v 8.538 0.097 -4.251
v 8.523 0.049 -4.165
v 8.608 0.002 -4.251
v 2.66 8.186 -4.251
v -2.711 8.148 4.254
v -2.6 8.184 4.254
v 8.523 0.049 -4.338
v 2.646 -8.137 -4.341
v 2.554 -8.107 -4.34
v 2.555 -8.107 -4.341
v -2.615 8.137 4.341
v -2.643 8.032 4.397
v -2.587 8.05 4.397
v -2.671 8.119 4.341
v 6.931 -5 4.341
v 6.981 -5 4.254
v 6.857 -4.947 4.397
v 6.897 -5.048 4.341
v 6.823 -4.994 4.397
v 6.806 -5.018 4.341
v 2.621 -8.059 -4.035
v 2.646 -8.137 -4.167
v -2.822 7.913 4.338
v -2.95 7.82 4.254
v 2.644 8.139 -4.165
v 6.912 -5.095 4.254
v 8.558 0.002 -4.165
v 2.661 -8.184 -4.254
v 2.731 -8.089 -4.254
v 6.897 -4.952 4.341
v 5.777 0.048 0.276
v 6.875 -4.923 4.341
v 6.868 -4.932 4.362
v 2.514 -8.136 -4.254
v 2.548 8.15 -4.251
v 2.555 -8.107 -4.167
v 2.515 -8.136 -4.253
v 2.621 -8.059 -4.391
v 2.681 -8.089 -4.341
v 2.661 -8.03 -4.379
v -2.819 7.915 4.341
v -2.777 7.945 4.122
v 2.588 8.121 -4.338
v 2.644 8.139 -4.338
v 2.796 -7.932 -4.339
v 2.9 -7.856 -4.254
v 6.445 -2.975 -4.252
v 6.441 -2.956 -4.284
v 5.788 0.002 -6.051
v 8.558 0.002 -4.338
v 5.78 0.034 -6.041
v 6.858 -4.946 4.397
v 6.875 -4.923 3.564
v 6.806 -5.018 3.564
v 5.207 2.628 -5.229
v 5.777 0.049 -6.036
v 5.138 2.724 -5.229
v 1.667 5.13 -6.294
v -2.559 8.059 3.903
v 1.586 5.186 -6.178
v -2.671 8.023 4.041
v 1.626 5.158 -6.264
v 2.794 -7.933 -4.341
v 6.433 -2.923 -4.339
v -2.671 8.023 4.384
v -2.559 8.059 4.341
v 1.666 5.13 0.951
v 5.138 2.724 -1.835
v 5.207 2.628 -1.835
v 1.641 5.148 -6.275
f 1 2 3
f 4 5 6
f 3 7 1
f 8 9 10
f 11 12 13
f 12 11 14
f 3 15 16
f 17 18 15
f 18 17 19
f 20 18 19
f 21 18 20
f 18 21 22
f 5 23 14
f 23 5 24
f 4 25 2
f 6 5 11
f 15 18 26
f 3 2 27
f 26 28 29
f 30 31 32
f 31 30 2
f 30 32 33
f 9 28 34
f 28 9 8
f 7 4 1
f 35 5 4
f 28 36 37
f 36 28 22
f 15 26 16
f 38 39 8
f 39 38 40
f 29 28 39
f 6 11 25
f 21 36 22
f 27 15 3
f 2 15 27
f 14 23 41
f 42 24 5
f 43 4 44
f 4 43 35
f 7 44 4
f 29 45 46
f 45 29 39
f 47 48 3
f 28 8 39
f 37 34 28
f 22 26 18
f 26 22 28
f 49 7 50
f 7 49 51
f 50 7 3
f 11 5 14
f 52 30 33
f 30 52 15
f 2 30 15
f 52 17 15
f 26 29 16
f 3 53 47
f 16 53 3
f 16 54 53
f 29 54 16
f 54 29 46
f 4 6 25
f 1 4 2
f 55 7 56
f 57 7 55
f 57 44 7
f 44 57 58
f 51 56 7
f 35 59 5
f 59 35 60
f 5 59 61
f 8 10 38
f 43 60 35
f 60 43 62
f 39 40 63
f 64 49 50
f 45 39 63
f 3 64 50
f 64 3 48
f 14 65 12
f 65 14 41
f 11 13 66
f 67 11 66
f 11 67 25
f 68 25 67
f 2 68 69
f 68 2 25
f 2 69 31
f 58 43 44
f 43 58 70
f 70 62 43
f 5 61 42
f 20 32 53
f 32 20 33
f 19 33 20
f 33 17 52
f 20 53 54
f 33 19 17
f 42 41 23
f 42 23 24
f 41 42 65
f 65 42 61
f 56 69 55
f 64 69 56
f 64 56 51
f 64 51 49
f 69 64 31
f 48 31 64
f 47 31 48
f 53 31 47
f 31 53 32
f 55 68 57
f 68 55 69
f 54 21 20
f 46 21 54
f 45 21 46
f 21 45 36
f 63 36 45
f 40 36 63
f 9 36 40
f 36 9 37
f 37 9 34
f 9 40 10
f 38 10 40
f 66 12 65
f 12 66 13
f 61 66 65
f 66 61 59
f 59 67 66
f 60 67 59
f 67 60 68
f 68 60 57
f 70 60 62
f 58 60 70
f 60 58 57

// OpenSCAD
// Auto-generated OpenSCAD file

    inner_points = 10*[[-0.5679521834680924, 0.3710392408495472, -0.708875678733561], [0.6774959295154908, -0.4922625333758151, -0.14177512924090818], [-1.0679348487285032, 0.2085260495957944, 0.14177512924090818], [0.17751326425508, -0.6547757246295679, 0.708875678733561], [0.010822126776322105, -0.4253965348253418, -0.8841193748434077], [-0.7981668194007837, -0.6883484018941259, 0.4922625450168436], [-0.2589805762752483, 0.796397621522542, 0.14177512737898157], [0.5107486887730253, 0.2628477825031803, 0.49226254200418296], [-0.13145834293776412, -1.0801341053025628, -0.14177512737898157]];

    outer_points = 10*[[-0.8507501659543638, -0.00016416400980563553, 0.42512659922224816], [0.0002222331138788114, 0.00016416400980563553, -0.9510564761622176], [-0.0002222331138788114, -0.00016416400980563553, 0.9510564761622176], [0.8507501659543638, 0.00016416400980563553, -0.42512659922224816], [-0.6880381915718803, -0.49999998970608384, -0.42557250195458624], [0.6881449121452123, -0.49999998970608384, 0.4253999146333339], [-0.26305127181358173, 0.8089155187812519, 0.4254035837408861], [0.2628785942986316, 0.8091184366568306, -0.4251243315890725], [0.26305127181358173, -0.8089155187812519, -0.4254035837408861]];

    // Convex hull for inner set (I)
    module inner_hull() {
        hull() {
            for (p = inner_points) {
                translate(p) sphere(r=0.1);
            }
        }
    }

    // Convex hull for outer set (O) minus inner hull (O \ I)
    module outer_minus_inner() {
        difference() {
            hull() {
                for (p = outer_points) {
                    translate(p) sphere(r=0.1);
                }
            }
            inner_hull(); // Subtract inner hull
        }
    }

    // Convex hull for outer set (O) minus all translated inner hulls
    module outer_minus_AllTranslationInner() {
        difference() {
            hull() {
                for (p = outer_points) {
                    translate(p) sphere(r=0.1);
                }
            }
            hull() {
                translate([0,0,50]) inner_hull();
                translate([0,0,-50]) inner_hull();
            }; // Subtract translated inner hulls
        }
    }

    // Difference between outer_minus_inner and outer_minus_AllTranslationInner
    module outer_minus_inner_diff() {
        difference() {
            // Outer minus inner
            difference() {
                hull() {
                    for (p = outer_points) {
                        translate(p) sphere(r=0.1);
                    }
                }
                inner_hull();
            }

            // Subtract Outer minus AllTranslationInner
            difference() {
                hull() {
                    for (p = outer_points) {
                        translate(p) sphere(r=0.1);
                    }
                }
                hull() {
                    translate([0,0,50]) inner_hull();
                    translate([0,0,-50]) inner_hull();
                };
            }
        }
    }

    // Rendering all with colors applied
    color([0, 1, 0, 1]) outer_minus_AllTranslationInner(); // Opaque green
    
